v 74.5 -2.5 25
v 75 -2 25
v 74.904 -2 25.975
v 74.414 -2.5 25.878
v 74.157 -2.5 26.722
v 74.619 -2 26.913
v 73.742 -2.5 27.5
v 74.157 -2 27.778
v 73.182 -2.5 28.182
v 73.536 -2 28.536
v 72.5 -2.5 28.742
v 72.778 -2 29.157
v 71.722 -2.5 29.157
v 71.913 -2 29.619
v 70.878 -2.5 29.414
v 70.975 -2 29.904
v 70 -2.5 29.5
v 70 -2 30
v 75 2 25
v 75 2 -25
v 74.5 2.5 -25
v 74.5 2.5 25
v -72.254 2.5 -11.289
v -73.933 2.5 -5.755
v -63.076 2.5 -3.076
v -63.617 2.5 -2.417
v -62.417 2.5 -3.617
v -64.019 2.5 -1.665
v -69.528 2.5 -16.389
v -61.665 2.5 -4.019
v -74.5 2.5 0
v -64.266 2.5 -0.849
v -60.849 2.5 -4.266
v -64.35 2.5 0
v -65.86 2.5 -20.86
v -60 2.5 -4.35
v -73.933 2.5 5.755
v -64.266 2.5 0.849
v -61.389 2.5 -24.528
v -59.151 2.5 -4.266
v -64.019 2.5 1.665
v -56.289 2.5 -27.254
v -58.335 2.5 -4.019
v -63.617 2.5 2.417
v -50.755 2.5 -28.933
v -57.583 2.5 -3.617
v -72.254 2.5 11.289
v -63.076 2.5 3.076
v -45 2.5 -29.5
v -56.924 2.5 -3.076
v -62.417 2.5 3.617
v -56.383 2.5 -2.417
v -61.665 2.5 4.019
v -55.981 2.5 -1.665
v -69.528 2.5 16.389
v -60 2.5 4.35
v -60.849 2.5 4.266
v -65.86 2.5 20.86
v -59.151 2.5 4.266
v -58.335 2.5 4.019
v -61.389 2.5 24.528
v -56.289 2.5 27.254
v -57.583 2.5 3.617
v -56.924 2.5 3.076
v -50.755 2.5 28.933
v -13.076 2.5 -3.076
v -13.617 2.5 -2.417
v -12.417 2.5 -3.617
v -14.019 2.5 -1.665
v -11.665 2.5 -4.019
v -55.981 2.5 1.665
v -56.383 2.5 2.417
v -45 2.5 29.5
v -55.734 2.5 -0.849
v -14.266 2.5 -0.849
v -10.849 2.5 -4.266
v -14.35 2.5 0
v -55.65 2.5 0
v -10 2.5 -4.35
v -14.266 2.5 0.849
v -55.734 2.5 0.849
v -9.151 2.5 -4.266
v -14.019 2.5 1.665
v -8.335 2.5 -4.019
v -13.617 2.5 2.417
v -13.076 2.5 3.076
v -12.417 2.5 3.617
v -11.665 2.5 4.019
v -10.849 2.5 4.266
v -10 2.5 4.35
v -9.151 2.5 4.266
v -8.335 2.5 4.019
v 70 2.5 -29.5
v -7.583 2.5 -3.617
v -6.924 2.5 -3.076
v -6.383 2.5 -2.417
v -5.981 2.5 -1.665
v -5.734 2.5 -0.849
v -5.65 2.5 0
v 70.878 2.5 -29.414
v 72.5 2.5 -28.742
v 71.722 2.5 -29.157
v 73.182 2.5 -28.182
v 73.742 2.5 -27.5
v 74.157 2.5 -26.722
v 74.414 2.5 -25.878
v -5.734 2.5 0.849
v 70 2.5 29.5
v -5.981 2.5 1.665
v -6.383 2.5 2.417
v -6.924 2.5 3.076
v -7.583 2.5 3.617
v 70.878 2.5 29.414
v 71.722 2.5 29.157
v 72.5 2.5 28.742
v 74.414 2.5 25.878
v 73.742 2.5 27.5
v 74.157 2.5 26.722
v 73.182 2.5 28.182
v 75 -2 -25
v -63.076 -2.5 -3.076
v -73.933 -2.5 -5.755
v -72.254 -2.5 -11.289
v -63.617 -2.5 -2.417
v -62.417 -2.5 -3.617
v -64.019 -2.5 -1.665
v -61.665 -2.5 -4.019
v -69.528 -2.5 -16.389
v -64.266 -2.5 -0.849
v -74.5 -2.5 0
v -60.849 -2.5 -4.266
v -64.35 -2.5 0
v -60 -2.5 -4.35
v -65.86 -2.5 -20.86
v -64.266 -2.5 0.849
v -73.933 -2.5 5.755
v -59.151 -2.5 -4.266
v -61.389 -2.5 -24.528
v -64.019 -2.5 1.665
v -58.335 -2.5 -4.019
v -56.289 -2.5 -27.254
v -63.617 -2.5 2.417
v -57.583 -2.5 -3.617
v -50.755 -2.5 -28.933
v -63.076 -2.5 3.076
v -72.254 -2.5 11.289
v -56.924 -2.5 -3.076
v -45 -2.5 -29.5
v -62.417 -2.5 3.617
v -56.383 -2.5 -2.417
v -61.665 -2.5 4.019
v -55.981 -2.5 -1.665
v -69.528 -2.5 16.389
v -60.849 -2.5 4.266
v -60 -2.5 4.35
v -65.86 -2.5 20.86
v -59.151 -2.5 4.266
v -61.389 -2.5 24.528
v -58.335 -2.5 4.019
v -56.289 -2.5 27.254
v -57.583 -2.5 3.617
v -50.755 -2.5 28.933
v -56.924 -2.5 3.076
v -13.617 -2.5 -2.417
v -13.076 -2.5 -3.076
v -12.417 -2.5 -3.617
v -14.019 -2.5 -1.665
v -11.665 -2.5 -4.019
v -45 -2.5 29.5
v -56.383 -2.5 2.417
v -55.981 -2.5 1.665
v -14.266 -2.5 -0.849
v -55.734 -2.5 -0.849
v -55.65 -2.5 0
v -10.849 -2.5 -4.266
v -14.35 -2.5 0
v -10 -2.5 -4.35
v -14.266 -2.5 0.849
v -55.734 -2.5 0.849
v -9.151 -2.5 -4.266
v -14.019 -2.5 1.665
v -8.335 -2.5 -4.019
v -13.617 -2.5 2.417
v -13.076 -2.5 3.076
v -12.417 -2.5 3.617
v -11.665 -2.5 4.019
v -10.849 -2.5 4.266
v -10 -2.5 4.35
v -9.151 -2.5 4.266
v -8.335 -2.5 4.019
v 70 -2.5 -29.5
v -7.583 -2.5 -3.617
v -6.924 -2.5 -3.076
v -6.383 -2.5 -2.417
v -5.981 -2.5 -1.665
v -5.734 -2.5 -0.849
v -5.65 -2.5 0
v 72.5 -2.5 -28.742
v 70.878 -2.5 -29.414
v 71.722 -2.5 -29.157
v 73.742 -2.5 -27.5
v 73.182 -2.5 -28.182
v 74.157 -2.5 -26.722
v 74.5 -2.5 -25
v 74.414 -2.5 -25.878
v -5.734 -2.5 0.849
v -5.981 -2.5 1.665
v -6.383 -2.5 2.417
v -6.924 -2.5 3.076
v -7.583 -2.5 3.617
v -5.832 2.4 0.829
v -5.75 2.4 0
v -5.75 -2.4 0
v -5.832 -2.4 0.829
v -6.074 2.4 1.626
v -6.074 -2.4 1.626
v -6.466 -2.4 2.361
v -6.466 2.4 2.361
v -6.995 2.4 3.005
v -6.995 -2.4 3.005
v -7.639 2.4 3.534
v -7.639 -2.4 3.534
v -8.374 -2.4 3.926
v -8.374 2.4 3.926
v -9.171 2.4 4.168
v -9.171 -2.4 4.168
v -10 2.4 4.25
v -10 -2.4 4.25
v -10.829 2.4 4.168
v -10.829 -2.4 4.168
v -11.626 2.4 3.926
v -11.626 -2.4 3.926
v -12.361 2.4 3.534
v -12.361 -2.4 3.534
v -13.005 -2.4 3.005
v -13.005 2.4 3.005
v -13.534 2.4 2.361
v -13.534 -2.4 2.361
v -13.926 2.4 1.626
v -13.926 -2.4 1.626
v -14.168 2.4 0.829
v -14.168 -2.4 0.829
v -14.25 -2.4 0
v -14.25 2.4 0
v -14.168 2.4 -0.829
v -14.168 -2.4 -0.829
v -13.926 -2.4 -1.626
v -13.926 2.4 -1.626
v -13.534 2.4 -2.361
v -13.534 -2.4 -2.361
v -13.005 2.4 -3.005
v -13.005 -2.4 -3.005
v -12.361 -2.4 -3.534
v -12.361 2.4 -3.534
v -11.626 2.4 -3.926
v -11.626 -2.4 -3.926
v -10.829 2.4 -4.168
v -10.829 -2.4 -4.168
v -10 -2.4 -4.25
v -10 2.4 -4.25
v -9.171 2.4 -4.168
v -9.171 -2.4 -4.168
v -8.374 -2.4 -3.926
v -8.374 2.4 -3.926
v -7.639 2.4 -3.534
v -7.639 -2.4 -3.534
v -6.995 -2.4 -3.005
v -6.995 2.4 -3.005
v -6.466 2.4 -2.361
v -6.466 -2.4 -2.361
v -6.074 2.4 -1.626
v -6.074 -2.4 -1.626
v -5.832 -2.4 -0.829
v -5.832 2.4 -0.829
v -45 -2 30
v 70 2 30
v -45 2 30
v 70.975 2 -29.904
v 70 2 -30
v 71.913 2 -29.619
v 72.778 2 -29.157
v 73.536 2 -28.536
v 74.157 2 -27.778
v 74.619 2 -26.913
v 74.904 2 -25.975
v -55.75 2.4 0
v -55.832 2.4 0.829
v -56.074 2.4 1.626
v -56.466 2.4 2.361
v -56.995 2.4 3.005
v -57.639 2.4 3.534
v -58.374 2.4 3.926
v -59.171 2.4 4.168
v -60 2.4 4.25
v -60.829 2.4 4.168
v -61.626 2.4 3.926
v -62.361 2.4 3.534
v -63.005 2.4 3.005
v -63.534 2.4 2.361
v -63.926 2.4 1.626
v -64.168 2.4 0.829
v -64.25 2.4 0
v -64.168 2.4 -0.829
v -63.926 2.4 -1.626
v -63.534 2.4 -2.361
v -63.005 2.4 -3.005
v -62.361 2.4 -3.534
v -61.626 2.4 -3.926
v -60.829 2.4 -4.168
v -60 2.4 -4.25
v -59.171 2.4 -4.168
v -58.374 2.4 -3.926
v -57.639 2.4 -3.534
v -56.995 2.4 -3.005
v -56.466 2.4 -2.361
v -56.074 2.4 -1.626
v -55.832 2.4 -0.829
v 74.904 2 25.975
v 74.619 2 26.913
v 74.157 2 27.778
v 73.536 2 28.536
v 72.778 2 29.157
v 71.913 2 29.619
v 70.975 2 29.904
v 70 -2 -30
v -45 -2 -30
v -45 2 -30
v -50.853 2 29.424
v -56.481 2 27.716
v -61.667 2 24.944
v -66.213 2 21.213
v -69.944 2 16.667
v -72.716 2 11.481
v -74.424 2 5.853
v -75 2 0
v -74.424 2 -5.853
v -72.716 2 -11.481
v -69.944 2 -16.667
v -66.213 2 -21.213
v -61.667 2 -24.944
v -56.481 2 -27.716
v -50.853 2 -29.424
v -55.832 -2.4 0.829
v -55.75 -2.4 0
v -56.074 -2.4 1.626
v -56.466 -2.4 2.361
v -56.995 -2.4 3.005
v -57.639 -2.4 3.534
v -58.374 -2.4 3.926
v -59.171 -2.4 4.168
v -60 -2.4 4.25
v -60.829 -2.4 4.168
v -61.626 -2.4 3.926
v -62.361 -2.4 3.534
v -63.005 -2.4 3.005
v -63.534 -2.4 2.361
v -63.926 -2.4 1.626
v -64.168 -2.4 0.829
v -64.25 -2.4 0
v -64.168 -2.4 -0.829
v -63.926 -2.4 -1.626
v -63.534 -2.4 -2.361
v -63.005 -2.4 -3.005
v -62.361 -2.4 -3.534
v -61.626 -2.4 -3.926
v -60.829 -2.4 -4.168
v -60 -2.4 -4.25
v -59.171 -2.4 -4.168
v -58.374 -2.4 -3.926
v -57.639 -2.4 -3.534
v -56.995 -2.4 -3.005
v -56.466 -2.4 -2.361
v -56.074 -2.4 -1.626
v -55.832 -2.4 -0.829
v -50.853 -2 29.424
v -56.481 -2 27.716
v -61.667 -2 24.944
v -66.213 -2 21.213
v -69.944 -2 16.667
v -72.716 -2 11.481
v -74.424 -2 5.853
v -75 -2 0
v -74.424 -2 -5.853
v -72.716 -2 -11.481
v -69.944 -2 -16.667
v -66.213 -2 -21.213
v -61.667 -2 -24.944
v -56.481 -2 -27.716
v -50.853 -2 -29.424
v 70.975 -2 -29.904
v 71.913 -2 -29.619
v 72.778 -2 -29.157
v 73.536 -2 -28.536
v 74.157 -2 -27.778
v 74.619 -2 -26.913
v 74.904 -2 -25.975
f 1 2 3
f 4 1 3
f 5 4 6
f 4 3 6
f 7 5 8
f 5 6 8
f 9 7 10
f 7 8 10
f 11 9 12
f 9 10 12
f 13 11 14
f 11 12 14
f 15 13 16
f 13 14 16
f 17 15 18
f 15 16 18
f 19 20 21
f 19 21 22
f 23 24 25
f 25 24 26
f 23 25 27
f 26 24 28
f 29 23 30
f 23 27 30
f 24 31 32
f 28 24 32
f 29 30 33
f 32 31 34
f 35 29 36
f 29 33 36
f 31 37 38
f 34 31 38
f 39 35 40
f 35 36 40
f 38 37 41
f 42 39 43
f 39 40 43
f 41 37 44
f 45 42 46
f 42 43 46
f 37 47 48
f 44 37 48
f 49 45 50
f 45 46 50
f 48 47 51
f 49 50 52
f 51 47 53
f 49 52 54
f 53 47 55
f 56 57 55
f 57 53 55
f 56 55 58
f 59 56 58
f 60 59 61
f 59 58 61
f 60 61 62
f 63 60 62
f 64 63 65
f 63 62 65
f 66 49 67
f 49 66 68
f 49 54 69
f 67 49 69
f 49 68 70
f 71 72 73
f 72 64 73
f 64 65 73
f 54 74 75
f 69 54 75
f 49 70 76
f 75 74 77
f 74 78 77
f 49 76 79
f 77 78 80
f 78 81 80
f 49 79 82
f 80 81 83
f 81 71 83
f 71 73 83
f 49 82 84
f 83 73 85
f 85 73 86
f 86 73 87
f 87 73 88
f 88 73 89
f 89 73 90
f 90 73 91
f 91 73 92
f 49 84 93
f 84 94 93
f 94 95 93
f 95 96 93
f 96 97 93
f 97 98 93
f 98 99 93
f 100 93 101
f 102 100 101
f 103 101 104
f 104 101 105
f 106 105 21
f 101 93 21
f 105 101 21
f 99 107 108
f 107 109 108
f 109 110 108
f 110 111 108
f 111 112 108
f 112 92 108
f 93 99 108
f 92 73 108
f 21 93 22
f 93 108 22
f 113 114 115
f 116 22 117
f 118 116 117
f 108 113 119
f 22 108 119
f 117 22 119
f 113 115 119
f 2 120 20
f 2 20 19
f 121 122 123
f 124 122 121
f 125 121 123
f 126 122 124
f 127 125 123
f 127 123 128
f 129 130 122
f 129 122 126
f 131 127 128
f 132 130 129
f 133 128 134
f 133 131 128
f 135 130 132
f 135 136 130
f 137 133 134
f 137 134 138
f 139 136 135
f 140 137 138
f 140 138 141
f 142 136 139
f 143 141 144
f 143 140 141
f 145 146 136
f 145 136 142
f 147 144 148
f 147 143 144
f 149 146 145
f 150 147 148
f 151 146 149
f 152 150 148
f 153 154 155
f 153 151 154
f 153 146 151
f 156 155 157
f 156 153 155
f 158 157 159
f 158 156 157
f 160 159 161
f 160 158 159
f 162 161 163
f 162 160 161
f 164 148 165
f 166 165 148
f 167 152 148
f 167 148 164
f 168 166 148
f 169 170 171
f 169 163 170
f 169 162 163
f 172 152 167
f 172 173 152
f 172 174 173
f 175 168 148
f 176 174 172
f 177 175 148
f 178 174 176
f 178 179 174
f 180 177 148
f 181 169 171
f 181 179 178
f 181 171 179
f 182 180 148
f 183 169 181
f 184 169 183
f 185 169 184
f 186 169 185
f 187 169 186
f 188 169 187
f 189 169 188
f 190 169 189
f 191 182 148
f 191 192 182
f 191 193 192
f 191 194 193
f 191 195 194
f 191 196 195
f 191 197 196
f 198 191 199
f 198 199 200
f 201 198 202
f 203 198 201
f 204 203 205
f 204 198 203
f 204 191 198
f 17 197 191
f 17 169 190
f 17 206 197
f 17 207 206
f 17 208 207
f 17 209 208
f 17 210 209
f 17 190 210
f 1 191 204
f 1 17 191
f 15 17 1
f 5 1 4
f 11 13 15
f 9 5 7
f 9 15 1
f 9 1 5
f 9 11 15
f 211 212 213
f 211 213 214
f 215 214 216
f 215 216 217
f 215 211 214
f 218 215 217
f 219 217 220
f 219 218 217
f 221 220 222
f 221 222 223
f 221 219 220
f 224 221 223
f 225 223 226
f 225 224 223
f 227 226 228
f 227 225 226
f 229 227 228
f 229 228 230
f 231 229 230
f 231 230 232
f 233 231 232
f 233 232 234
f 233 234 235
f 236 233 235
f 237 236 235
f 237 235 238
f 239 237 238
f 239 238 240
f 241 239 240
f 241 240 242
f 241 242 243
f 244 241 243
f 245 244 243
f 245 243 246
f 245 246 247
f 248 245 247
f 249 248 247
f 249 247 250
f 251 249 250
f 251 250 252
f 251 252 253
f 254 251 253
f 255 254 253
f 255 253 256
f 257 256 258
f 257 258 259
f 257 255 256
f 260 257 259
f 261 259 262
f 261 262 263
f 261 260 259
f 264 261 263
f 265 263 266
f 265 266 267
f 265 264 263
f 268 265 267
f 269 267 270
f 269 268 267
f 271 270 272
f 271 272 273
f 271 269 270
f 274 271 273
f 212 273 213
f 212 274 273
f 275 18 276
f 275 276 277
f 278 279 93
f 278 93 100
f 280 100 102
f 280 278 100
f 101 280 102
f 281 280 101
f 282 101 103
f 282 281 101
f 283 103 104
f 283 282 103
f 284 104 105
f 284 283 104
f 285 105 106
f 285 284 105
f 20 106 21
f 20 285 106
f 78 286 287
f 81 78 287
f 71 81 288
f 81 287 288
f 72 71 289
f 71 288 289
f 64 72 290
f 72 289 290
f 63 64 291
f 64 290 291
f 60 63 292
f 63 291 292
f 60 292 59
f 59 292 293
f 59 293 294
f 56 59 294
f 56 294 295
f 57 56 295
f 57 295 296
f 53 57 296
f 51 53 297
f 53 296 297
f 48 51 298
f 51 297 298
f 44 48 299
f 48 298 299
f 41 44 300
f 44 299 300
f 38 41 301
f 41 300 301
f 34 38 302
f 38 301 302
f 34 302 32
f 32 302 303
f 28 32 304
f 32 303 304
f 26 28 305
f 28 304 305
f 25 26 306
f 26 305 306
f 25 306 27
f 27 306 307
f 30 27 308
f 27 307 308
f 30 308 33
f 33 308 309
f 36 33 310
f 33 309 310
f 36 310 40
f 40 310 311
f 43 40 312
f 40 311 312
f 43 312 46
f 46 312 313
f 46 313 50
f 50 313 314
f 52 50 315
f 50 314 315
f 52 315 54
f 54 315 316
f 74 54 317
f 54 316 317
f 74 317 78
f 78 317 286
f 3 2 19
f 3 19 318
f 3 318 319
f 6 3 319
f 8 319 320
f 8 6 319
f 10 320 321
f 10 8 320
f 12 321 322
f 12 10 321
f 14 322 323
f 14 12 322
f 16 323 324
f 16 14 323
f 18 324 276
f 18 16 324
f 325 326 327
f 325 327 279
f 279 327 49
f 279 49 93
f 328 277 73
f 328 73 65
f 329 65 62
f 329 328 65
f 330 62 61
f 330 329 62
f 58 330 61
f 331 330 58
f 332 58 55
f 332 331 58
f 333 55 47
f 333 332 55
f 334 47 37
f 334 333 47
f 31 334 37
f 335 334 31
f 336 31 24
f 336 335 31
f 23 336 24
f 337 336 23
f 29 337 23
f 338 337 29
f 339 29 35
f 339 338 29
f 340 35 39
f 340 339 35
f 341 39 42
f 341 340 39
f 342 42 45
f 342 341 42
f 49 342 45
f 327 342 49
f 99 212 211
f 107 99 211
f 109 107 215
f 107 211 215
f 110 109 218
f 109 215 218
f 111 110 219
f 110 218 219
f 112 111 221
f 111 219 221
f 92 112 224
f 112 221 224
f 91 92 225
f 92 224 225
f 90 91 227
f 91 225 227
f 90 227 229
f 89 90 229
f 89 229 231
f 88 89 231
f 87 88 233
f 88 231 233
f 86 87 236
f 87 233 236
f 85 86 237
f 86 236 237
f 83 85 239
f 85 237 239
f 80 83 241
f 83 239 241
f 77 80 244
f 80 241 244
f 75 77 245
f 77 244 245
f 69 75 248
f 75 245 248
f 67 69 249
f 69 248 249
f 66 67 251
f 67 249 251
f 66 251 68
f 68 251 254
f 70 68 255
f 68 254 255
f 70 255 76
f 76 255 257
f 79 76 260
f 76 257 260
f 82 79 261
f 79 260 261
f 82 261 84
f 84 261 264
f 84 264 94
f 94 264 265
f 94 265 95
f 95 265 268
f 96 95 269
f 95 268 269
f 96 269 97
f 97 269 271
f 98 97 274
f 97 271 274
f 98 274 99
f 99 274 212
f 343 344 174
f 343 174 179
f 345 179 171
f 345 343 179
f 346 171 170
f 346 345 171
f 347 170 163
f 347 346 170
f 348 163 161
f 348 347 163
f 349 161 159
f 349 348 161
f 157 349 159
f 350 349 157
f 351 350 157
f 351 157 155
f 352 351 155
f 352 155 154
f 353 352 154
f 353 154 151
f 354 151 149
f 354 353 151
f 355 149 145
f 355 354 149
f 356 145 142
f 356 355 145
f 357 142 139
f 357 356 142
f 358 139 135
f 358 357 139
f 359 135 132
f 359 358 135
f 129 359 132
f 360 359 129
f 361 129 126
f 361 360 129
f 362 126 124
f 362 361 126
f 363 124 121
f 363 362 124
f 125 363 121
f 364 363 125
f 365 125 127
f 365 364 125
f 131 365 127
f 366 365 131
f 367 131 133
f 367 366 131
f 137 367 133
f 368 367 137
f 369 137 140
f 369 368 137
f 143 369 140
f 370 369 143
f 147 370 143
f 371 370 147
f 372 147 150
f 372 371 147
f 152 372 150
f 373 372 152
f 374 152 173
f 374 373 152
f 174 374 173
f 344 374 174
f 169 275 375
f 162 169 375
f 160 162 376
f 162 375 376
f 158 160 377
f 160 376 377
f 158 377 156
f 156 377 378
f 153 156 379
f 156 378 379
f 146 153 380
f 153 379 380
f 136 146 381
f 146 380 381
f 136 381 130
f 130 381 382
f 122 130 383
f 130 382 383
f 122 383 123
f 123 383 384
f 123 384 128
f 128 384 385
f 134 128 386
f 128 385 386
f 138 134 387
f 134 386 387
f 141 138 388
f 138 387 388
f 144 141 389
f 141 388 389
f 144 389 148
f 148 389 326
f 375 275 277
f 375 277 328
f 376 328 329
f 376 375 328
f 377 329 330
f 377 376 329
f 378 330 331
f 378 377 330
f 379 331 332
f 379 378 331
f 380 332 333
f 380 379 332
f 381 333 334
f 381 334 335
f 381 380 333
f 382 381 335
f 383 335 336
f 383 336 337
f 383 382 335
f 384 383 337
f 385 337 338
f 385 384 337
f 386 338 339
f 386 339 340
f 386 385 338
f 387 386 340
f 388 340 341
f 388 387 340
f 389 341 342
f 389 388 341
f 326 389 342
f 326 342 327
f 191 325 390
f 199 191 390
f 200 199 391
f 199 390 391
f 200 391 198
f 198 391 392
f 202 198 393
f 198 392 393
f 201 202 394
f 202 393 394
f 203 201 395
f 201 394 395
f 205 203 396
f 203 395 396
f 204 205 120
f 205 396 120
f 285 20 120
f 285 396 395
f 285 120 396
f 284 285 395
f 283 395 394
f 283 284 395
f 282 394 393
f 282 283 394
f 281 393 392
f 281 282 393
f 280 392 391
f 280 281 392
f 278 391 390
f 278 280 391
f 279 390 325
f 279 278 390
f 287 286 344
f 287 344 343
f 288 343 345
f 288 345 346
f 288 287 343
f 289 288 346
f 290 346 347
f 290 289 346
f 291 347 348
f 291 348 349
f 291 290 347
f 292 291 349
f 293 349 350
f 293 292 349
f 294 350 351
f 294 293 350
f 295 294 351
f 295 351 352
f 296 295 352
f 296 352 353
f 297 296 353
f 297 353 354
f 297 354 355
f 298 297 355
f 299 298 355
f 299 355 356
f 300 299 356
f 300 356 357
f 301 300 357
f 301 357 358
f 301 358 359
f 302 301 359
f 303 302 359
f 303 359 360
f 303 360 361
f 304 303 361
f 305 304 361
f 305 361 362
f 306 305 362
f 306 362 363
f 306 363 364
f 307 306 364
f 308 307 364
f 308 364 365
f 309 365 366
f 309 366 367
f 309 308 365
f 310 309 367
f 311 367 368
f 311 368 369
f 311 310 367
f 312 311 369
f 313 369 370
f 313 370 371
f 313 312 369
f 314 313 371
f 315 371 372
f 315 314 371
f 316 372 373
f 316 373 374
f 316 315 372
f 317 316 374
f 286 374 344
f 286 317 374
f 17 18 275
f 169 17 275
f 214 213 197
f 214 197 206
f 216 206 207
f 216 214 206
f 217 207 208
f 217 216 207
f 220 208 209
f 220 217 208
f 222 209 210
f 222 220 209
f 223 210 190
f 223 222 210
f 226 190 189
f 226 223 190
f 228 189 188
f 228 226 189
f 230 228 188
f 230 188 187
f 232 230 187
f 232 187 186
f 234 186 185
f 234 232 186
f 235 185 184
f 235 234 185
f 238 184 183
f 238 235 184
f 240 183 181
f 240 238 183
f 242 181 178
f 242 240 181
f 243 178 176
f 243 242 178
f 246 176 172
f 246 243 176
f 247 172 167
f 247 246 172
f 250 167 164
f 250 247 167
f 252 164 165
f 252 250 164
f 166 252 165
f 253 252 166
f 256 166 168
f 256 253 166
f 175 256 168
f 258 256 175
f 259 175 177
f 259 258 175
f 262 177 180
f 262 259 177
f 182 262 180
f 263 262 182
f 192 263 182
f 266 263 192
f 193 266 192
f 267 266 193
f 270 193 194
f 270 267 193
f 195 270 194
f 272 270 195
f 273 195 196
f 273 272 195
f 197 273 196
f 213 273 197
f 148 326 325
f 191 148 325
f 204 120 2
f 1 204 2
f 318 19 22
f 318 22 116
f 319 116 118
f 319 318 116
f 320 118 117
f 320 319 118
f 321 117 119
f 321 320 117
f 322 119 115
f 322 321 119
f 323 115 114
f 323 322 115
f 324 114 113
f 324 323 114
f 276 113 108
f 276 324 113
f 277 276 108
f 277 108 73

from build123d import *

# Parameters (mm, degrees)
F0_R     = 4.25
F1_DEPTH = 2.5
F2_R     = 5
F3_SIZE  = 0.5
F4_SIZE  = 0.1


with BuildPart() as f1:
    # F0 (on Front) → F1 (new body, symmetric)
    with BuildSketch(Plane.XZ):
        with BuildLine():
            Line((75, -30), (75, 30))
            Line((75, 30), (-45, 30))
            ThreePointArc((-45, 30), (-75, 0), (-45, -30))
            Line((-45, -30), (75, -30))
        make_face()
        with Locations((-60, 0)):
            Circle(F0_R, mode=Mode.SUBTRACT)
        with Locations((-10, 0)):
            Circle(F0_R, mode=Mode.SUBTRACT)
    extrude(amount=F1_DEPTH, both=True)

    # F2
    f2_edges = [f1.edges().sort_by_distance(p)[0] for p in [
        (75, 0, -30),
        (75, 0, 30),
    ]]
    fillet(f2_edges, radius=F2_R)

    # F3
    f3_edges = [f1.edges().sort_by_distance(p)[0] for p in [
        (12.5, -2.5, -30),
        (12.5, 2.5, 30),
    ]]
    chamfer(f3_edges, length=F3_SIZE)

    # F4
    f4_edges = [f1.edges().sort_by_distance(p)[0] for p in [
        (-14.25, 2.5, 0),
        (-64.25, 2.5, 0),
        (-64.25, -2.5, 0),
        (-14.25, -2.5, 0),
    ]]
    chamfer(f4_edges, length=F4_SIZE)


solid = f1.part
